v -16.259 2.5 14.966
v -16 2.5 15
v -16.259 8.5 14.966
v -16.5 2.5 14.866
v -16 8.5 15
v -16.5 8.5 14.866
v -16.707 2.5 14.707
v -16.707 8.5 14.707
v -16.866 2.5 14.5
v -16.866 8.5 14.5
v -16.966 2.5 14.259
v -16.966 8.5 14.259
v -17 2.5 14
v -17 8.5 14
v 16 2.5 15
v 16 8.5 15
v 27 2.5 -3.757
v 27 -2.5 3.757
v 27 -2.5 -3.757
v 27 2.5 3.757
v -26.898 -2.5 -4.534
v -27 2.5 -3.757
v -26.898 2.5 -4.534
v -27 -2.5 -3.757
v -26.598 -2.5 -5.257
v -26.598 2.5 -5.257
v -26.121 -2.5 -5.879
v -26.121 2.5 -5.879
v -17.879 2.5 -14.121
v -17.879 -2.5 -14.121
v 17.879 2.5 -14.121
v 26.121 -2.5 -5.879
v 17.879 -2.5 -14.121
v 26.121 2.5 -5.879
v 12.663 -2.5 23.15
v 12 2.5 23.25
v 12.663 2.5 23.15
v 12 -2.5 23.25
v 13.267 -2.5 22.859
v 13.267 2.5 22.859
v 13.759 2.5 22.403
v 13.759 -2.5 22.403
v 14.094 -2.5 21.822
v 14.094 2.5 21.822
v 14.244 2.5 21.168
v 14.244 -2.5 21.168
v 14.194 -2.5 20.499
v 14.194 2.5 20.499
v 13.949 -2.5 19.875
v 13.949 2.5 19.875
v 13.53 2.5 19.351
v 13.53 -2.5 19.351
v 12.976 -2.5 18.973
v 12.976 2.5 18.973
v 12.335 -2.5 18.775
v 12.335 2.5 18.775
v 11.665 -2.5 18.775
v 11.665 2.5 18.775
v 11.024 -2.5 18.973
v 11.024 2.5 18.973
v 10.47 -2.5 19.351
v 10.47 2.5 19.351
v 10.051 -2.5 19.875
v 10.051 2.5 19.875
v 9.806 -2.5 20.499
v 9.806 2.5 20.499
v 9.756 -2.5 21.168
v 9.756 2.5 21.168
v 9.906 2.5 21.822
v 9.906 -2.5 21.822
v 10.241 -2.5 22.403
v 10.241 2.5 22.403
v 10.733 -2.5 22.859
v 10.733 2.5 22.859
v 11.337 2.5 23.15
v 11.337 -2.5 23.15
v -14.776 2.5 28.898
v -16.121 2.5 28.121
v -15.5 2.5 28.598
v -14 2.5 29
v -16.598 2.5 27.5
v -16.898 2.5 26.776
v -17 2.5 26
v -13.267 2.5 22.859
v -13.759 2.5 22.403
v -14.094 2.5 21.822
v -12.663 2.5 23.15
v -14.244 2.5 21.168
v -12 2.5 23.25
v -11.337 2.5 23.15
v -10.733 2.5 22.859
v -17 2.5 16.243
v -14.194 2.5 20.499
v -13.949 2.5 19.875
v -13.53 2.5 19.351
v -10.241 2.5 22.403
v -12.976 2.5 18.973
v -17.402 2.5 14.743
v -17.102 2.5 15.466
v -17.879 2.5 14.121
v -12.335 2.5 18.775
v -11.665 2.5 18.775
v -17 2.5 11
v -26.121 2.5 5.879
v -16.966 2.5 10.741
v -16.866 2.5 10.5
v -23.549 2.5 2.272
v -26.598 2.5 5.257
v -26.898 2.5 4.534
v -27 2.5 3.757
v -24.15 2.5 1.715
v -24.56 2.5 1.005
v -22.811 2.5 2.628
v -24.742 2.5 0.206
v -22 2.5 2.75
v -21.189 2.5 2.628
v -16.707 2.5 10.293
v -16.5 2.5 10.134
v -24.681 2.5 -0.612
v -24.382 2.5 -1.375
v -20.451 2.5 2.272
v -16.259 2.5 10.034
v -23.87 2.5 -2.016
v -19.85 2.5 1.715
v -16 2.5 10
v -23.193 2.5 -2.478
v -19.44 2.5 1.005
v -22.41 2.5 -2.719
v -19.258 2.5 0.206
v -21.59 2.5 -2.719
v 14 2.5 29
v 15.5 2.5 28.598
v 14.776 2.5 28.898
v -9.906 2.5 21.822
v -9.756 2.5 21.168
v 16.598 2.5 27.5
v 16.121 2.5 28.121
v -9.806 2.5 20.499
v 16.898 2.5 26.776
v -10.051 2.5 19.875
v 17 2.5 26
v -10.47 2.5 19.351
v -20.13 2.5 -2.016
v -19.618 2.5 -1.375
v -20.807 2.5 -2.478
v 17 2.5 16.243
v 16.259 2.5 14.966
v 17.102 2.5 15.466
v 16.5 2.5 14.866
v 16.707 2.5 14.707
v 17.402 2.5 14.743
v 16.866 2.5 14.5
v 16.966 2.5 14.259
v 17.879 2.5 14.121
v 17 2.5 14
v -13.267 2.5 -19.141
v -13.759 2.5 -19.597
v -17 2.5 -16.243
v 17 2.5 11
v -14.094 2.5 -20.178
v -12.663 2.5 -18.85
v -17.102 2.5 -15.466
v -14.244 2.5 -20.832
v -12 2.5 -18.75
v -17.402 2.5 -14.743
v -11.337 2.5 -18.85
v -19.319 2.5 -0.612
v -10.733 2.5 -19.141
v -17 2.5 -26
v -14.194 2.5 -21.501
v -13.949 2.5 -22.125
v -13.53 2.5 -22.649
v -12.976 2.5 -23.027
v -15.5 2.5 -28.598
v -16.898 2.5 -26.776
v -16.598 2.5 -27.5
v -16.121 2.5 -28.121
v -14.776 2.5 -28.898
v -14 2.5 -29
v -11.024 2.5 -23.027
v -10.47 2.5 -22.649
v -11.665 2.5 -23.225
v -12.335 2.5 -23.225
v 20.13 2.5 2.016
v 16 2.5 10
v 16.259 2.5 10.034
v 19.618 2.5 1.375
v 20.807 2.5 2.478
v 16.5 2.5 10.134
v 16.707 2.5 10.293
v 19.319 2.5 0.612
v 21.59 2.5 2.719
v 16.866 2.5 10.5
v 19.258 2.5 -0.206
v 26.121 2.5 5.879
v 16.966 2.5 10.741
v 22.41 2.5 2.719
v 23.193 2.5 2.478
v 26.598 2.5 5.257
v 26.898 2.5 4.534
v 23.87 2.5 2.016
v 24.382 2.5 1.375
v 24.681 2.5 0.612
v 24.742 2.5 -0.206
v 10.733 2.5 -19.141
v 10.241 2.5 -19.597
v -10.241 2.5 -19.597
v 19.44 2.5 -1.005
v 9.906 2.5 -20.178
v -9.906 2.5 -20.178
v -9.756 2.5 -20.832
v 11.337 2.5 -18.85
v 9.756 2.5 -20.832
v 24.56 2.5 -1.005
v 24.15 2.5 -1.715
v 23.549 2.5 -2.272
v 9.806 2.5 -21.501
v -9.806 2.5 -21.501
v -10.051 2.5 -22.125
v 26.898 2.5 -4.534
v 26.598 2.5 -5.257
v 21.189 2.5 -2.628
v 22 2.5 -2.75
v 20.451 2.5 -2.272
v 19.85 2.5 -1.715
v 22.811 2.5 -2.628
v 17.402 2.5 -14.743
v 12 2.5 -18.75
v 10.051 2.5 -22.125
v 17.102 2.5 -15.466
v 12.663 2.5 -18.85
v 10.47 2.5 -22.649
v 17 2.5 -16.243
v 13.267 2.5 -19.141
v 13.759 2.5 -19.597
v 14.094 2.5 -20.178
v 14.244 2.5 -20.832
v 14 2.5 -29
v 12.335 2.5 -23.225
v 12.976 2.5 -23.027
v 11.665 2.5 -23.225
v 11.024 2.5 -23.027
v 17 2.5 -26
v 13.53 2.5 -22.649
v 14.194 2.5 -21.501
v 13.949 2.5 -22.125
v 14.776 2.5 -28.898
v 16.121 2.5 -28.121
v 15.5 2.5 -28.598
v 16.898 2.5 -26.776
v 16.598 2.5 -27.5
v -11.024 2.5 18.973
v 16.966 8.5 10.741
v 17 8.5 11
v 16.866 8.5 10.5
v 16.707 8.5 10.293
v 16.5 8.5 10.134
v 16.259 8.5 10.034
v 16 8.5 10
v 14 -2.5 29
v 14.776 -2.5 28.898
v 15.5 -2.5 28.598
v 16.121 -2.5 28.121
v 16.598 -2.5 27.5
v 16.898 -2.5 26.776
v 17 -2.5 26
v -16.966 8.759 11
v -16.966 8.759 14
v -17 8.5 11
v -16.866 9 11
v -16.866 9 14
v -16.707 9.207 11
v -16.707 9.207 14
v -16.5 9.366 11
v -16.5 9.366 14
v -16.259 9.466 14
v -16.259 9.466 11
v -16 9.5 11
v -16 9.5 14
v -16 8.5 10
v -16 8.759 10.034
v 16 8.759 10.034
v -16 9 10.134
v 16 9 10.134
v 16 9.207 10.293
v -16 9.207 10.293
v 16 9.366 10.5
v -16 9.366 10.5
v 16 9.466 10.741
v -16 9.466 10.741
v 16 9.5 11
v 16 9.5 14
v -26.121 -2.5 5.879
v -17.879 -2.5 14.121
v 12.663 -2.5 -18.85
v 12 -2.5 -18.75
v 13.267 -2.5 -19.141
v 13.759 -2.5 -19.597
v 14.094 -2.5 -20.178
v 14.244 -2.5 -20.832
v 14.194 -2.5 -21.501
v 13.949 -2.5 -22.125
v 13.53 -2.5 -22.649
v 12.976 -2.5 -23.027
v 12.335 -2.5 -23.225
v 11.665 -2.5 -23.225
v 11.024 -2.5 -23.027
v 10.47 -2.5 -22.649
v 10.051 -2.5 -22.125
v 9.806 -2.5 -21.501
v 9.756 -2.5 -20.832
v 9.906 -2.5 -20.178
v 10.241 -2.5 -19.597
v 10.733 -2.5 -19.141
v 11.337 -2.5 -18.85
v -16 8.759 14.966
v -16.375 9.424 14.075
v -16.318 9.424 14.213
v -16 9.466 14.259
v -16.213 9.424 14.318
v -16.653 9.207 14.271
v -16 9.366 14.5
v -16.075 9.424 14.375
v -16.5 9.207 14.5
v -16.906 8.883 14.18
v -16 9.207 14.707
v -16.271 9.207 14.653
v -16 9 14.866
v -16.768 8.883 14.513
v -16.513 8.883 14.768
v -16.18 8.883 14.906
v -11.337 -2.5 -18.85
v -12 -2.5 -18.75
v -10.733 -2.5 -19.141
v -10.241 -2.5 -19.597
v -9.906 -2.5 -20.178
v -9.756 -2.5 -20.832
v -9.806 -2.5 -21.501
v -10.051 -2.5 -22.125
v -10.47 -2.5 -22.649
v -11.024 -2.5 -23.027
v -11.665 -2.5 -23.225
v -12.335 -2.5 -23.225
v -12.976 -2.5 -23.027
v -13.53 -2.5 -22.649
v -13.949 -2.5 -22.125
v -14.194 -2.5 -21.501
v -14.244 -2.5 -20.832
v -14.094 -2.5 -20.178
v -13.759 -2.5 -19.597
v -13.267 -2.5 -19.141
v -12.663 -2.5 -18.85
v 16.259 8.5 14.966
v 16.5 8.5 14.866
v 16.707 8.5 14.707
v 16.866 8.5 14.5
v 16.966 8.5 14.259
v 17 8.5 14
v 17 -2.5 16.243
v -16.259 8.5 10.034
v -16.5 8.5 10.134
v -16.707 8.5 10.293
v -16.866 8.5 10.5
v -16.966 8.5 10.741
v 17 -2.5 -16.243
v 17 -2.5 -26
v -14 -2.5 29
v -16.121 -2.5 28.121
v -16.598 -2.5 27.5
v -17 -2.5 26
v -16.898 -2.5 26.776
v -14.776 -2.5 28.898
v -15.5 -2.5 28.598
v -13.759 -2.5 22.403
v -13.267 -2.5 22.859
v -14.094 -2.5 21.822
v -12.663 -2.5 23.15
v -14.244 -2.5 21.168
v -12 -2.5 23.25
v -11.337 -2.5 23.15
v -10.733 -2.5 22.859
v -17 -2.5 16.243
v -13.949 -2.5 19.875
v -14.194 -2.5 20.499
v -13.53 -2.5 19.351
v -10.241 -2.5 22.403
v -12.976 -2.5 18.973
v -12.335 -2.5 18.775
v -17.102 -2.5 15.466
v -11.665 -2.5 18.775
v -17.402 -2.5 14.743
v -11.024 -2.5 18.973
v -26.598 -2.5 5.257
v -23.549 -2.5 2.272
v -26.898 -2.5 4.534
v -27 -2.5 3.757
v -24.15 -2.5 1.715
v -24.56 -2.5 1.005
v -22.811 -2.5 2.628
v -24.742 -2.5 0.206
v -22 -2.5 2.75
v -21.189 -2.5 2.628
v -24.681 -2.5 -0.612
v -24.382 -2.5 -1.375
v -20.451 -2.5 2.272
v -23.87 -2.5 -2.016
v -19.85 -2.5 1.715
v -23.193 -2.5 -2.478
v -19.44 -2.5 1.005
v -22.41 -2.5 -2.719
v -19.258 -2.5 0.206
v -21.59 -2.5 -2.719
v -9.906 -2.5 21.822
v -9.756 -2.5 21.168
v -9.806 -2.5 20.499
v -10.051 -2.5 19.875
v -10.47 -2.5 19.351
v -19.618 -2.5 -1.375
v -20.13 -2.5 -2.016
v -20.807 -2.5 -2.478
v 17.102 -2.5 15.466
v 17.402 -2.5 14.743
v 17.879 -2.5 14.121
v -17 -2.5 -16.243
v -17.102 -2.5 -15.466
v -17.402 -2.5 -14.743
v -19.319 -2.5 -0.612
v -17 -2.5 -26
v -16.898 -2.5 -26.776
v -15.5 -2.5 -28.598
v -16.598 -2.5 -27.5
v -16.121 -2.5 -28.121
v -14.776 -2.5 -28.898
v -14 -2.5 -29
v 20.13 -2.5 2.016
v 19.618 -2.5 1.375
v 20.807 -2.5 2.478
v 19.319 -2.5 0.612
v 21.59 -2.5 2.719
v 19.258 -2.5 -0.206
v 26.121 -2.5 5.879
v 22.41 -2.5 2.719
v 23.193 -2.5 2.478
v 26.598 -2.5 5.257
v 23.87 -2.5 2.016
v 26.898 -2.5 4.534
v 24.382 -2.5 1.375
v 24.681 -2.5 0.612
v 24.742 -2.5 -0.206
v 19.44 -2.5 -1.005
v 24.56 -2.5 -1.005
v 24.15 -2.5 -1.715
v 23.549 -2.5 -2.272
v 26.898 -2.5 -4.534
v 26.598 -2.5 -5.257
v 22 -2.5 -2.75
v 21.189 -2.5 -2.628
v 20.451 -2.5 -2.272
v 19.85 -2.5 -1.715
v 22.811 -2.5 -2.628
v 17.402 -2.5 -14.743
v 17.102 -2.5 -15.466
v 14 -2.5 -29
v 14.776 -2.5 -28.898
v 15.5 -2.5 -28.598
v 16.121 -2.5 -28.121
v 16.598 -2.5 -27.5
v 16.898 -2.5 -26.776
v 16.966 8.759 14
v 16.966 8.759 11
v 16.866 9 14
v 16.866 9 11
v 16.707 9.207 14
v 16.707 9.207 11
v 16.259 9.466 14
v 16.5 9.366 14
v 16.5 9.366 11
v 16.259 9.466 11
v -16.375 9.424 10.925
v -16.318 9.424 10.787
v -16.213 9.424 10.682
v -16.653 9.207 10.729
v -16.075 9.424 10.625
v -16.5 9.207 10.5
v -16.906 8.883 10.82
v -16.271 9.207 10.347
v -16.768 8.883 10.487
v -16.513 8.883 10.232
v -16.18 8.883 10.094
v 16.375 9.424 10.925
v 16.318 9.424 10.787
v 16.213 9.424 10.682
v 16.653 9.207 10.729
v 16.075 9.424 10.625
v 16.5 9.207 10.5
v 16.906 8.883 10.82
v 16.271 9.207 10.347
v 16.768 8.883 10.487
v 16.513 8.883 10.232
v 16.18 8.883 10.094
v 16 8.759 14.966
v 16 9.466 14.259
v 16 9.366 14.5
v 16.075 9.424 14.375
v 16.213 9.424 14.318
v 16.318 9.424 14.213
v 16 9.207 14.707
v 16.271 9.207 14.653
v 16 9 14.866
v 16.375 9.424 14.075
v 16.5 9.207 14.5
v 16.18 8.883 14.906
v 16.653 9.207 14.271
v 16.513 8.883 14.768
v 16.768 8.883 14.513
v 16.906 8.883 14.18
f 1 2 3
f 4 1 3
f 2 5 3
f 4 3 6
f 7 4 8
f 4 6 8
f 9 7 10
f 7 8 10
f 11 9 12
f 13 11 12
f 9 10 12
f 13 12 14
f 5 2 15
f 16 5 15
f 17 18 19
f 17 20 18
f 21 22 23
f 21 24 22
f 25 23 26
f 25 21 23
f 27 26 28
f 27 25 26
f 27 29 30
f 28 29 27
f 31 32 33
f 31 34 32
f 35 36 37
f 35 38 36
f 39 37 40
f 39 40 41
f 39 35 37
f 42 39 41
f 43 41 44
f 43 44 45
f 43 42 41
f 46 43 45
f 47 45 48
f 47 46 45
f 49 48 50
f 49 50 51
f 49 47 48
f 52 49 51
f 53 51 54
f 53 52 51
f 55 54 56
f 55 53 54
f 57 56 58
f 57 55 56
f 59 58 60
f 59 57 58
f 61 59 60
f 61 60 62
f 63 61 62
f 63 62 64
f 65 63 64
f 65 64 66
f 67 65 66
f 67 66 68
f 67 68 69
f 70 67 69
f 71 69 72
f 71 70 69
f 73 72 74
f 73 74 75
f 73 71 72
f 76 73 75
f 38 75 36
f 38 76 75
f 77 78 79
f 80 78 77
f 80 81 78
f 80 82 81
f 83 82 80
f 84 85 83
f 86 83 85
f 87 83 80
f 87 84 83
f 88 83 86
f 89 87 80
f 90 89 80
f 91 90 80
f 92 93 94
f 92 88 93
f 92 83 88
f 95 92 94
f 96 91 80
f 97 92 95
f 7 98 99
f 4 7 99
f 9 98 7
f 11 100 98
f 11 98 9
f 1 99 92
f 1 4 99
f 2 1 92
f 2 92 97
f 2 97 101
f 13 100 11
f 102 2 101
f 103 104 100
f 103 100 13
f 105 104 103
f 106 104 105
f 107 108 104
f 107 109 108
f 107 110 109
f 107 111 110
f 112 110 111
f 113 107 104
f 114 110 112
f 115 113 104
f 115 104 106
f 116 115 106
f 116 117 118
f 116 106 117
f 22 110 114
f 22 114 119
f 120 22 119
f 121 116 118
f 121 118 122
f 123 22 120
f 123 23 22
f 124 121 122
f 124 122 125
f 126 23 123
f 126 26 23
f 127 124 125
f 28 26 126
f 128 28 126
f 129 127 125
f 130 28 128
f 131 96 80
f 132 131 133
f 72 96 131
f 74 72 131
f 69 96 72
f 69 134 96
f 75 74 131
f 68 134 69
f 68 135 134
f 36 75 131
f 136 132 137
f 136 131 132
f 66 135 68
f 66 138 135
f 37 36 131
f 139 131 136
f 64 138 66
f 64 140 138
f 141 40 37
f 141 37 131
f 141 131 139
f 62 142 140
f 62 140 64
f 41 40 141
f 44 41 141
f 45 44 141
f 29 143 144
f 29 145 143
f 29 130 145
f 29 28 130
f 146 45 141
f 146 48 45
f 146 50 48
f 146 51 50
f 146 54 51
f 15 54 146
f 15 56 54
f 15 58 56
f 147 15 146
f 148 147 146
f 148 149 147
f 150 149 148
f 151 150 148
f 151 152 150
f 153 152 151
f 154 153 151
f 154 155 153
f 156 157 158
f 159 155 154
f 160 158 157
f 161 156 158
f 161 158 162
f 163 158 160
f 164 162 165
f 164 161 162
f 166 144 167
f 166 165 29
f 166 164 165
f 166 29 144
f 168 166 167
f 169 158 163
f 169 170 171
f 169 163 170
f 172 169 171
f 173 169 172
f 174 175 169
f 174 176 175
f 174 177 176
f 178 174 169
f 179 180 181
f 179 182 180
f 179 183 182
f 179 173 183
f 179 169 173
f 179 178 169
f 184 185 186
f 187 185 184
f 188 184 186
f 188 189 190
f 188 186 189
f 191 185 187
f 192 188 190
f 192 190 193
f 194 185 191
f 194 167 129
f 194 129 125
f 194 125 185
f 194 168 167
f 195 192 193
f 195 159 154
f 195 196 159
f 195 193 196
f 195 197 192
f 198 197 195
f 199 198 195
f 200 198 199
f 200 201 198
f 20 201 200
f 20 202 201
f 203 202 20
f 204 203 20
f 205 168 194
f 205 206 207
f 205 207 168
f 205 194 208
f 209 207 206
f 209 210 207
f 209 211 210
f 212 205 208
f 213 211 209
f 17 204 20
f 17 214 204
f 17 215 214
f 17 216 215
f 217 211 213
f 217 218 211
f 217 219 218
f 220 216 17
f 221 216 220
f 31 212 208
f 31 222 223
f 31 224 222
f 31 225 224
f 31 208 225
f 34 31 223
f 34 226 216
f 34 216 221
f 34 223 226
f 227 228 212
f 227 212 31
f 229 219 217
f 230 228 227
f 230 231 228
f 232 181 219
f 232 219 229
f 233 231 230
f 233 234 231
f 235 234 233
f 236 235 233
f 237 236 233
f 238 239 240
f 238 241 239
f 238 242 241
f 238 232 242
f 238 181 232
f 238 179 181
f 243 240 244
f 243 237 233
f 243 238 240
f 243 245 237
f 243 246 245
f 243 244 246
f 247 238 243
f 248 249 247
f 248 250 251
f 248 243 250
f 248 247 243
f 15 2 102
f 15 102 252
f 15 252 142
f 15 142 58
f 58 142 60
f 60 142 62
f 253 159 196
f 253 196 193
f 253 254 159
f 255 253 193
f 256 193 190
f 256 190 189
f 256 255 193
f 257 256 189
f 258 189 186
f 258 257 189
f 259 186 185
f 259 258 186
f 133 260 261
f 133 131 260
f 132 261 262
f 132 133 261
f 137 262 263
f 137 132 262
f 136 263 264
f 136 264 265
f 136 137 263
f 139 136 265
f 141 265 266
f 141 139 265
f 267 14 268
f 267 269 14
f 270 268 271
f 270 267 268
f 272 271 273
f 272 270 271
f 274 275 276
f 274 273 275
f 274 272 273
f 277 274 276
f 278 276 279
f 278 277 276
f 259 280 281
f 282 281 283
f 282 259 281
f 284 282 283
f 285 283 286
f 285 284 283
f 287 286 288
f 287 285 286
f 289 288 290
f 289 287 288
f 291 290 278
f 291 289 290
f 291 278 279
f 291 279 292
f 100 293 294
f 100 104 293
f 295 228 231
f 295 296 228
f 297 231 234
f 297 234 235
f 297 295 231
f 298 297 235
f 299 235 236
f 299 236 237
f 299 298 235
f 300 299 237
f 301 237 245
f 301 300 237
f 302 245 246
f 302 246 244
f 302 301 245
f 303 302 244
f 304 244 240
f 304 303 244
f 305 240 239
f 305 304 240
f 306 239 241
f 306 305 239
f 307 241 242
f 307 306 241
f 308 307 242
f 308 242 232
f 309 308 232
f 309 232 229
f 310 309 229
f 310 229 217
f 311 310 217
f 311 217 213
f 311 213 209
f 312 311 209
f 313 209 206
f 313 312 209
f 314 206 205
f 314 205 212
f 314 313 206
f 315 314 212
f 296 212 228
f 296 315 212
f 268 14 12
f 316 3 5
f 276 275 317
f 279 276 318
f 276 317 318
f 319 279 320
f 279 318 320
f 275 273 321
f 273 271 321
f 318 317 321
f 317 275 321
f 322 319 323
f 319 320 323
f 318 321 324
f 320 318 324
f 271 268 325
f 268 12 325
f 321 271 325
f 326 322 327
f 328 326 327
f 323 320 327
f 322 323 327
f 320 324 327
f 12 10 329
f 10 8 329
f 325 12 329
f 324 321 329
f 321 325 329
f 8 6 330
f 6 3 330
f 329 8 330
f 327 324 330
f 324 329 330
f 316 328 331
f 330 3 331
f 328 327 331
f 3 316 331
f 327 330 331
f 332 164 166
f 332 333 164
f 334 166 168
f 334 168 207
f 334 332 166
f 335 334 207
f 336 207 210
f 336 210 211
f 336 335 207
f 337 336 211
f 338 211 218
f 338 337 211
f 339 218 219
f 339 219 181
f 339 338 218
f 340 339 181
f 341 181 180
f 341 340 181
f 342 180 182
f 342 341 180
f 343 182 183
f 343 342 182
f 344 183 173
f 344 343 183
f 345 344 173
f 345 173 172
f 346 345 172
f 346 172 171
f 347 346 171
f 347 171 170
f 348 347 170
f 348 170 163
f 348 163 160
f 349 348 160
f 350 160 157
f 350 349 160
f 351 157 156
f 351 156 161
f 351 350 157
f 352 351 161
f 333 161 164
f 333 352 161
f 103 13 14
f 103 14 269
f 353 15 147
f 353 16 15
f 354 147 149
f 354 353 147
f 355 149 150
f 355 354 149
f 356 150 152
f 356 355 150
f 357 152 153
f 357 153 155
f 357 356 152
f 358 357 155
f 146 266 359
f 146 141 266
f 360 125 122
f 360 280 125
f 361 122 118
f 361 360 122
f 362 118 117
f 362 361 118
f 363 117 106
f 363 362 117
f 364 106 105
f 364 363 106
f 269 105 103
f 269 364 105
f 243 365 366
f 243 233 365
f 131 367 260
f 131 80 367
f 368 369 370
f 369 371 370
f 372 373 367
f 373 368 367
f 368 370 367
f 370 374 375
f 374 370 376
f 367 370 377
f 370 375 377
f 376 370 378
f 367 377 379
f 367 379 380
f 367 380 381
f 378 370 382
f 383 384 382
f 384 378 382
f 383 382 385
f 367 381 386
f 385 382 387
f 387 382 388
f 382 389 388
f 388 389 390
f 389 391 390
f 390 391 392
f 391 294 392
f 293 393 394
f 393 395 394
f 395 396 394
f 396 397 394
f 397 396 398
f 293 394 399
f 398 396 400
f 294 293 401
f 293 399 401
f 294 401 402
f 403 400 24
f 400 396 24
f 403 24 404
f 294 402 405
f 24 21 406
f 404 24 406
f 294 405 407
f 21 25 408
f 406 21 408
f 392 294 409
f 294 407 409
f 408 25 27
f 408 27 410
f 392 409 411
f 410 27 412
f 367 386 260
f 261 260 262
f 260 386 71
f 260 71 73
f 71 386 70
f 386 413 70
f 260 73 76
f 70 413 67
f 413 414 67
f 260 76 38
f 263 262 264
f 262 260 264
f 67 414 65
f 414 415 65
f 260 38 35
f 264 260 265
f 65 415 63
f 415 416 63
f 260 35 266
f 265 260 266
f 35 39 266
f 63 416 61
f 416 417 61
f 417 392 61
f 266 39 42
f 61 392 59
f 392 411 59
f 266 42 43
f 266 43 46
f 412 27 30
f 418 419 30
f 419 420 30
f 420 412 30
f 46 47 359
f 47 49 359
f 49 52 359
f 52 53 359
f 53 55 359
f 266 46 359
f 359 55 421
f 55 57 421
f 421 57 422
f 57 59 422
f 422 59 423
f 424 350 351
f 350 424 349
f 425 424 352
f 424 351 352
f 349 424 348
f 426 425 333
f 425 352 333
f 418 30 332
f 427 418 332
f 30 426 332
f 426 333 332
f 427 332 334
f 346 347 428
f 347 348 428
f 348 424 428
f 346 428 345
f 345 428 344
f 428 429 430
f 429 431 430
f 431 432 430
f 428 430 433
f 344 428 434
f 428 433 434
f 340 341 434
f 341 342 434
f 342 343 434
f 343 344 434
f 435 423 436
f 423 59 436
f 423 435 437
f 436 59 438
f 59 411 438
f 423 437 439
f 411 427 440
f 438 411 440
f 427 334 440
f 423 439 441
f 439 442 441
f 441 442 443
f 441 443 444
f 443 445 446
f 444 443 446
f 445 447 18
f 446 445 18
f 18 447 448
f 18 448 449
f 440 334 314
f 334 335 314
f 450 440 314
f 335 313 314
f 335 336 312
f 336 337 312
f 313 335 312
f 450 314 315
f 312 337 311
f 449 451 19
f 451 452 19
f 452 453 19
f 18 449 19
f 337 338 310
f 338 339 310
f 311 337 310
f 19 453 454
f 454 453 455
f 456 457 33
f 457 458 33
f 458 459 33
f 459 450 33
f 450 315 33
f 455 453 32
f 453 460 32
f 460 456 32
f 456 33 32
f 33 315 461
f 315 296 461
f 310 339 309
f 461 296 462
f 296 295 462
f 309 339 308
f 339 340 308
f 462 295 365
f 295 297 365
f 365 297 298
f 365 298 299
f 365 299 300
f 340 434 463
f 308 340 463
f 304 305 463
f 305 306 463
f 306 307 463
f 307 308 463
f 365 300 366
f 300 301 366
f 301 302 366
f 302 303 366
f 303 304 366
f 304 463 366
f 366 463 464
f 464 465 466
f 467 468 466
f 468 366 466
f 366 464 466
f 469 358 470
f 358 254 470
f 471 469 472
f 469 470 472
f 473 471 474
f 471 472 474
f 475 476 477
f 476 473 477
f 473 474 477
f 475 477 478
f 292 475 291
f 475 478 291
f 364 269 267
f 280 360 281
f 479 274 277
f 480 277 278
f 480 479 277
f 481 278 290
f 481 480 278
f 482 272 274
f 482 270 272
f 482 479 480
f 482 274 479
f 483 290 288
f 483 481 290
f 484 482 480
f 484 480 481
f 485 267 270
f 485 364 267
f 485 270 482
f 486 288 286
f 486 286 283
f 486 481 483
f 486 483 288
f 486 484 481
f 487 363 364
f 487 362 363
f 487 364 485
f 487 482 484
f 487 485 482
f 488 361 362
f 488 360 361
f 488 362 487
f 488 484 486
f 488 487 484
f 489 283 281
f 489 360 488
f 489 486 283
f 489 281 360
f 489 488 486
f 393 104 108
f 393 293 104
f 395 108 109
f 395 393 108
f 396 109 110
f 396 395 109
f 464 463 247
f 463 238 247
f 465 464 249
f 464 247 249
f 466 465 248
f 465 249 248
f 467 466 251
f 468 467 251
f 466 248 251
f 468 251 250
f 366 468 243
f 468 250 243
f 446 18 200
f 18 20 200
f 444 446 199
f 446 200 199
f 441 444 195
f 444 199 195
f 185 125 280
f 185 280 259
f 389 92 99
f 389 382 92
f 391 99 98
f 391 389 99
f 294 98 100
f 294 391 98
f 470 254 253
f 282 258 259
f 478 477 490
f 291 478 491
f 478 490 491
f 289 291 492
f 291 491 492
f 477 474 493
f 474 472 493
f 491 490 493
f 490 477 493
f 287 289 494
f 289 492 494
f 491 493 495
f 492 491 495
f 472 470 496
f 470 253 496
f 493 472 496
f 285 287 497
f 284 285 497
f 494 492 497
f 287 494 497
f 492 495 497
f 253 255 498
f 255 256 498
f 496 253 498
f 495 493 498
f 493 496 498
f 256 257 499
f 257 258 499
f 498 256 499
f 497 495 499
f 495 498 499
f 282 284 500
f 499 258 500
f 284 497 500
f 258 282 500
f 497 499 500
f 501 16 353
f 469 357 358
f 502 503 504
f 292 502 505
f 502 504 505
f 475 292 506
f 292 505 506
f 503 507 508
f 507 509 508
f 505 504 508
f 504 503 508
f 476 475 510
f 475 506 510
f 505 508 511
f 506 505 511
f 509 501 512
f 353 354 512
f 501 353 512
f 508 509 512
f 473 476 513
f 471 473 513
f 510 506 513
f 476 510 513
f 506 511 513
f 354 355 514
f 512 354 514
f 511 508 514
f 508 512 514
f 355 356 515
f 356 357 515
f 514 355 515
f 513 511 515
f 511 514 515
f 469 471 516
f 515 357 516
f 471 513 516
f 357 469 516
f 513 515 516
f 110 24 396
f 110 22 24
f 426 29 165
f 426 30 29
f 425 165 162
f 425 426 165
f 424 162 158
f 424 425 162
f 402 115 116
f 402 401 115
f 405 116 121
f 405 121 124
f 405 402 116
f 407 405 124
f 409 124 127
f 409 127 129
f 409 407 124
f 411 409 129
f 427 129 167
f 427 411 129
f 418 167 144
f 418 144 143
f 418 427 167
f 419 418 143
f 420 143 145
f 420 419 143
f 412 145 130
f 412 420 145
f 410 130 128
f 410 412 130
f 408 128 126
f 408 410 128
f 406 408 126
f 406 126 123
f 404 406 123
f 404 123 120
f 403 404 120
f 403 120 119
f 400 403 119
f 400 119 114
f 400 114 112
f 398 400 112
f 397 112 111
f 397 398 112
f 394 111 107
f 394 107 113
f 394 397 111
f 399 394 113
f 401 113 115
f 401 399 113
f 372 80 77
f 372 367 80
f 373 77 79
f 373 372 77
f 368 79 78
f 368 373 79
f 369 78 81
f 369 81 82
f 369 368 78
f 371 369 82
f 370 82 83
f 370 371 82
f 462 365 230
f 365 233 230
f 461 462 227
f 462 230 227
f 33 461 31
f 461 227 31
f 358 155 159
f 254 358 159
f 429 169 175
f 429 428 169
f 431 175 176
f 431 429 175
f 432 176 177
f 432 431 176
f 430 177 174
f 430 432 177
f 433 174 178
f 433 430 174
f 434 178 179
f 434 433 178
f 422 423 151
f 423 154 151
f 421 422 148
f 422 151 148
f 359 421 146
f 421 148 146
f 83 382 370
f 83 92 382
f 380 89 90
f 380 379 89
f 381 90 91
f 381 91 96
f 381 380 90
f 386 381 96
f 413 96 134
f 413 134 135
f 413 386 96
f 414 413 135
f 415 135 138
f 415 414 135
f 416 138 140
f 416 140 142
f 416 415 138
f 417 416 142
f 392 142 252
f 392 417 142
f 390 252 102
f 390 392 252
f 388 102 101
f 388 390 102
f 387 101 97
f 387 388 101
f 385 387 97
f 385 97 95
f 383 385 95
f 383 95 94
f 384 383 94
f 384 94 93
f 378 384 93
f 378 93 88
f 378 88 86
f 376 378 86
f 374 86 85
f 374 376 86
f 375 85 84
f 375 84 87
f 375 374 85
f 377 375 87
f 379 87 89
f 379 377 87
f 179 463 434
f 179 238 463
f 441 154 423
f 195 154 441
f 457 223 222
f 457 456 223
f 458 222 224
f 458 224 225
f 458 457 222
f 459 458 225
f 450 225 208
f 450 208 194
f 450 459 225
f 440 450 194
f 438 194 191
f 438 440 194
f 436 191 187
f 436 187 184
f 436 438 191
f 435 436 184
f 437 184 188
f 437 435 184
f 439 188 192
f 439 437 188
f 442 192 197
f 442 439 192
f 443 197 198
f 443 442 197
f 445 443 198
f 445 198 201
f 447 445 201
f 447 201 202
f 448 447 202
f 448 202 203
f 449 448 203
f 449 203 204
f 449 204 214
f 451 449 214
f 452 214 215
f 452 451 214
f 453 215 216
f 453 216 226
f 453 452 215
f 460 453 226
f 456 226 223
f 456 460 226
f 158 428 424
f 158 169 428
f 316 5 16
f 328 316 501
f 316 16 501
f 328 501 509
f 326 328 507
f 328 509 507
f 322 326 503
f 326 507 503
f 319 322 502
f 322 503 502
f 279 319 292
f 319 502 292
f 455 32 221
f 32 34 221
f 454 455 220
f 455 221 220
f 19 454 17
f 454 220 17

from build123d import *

# Parameters (mm, degrees)
SKETCH1_R           = 2.25
SKETCH1_R_2         = 2.75
BOSS_EXTRUDE1_DEPTH = 2.5
FILLET2_R           = 3
SKETCH2_W           = 34
SKETCH2_H           = 5
BOSS_EXTRUDE2_DEPTH = 7
FILLET3_R           = 1


with BuildPart() as part:
    # Sketch1 → Boss-Extrude1 (new, symmetric)
    with BuildSketch(Plane(origin=(0, 0, 0), x_dir=(1, 0, 0), z_dir=(0, 1, 0))):
        Polygon((-17, -29), (17, -29), (17, -15), (27, -5), (27, 5), (17, 15), (17, 29), (-17, 29), (-17, 15), (-27, 5), (-27, -5), (-17, -15), align=None)
        with Locations(Location((-12, 21, 0), (0, 0, 270))):
            Circle(SKETCH1_R, mode=Mode.SUBTRACT)
        with Locations(Location((12, 21, 0), (0, 0, 270))):
            Circle(SKETCH1_R, mode=Mode.SUBTRACT)
        with Locations(Location((-12, -21, 0), (0, 0, 270))):
            Circle(SKETCH1_R, mode=Mode.SUBTRACT)
        with Locations(Location((12, -21, 0), (0, 0, 270))):
            Circle(SKETCH1_R, mode=Mode.SUBTRACT)
        with Locations(Location((-22, 0, 0), (0, 0, 270))):
            Circle(SKETCH1_R_2, mode=Mode.SUBTRACT)
        with Locations(Location((22, 0, 0), (0, 0, 90))):
            Circle(SKETCH1_R_2, mode=Mode.SUBTRACT)
    extrude(amount=BOSS_EXTRUDE1_DEPTH, both=True)

    # Fillet2
    fillet2_edges = [part.edges().sort_by_distance(p)[0] for p in [
        (17, 0, -15),
        (27, 0, -5),
        (27, 0, 5),
        (17, 0, 15),
        (17, 0, 29),
        (-17, 0, 29),
        (-17, 0, 15),
        (-27, 0, 5),
        (-27, 0, -5),
        (-17, 0, -15),
        (-17, 0, -29),
        (17, 0, -29),
    ]]
    fillet(fillet2_edges, radius=FILLET2_R)

    # Sketch2 → Boss-Extrude2 (add)
    with BuildSketch(Plane(origin=(0, 2.5, 0), x_dir=(1, 0, 0), z_dir=(0, 1, 0))):
        with Locations((0, -12.5)):
            Rectangle(SKETCH2_W, SKETCH2_H)
    extrude(amount=BOSS_EXTRUDE2_DEPTH)

    # Fillet3
    fillet3_edges = [part.edges().sort_by_distance(p)[0] for p in [
        (-17, 6, 10),
        (-17, 6, 15),
        (17, 6, 15),
        (17, 6, 10),
        (-17, 9.5, 12.5),
        (0, 9.5, 15),
        (17, 9.5, 12.5),
        (0, 9.5, 10),
    ]]
    fillet(fillet3_edges, radius=FILLET3_R)


solid = part.part
